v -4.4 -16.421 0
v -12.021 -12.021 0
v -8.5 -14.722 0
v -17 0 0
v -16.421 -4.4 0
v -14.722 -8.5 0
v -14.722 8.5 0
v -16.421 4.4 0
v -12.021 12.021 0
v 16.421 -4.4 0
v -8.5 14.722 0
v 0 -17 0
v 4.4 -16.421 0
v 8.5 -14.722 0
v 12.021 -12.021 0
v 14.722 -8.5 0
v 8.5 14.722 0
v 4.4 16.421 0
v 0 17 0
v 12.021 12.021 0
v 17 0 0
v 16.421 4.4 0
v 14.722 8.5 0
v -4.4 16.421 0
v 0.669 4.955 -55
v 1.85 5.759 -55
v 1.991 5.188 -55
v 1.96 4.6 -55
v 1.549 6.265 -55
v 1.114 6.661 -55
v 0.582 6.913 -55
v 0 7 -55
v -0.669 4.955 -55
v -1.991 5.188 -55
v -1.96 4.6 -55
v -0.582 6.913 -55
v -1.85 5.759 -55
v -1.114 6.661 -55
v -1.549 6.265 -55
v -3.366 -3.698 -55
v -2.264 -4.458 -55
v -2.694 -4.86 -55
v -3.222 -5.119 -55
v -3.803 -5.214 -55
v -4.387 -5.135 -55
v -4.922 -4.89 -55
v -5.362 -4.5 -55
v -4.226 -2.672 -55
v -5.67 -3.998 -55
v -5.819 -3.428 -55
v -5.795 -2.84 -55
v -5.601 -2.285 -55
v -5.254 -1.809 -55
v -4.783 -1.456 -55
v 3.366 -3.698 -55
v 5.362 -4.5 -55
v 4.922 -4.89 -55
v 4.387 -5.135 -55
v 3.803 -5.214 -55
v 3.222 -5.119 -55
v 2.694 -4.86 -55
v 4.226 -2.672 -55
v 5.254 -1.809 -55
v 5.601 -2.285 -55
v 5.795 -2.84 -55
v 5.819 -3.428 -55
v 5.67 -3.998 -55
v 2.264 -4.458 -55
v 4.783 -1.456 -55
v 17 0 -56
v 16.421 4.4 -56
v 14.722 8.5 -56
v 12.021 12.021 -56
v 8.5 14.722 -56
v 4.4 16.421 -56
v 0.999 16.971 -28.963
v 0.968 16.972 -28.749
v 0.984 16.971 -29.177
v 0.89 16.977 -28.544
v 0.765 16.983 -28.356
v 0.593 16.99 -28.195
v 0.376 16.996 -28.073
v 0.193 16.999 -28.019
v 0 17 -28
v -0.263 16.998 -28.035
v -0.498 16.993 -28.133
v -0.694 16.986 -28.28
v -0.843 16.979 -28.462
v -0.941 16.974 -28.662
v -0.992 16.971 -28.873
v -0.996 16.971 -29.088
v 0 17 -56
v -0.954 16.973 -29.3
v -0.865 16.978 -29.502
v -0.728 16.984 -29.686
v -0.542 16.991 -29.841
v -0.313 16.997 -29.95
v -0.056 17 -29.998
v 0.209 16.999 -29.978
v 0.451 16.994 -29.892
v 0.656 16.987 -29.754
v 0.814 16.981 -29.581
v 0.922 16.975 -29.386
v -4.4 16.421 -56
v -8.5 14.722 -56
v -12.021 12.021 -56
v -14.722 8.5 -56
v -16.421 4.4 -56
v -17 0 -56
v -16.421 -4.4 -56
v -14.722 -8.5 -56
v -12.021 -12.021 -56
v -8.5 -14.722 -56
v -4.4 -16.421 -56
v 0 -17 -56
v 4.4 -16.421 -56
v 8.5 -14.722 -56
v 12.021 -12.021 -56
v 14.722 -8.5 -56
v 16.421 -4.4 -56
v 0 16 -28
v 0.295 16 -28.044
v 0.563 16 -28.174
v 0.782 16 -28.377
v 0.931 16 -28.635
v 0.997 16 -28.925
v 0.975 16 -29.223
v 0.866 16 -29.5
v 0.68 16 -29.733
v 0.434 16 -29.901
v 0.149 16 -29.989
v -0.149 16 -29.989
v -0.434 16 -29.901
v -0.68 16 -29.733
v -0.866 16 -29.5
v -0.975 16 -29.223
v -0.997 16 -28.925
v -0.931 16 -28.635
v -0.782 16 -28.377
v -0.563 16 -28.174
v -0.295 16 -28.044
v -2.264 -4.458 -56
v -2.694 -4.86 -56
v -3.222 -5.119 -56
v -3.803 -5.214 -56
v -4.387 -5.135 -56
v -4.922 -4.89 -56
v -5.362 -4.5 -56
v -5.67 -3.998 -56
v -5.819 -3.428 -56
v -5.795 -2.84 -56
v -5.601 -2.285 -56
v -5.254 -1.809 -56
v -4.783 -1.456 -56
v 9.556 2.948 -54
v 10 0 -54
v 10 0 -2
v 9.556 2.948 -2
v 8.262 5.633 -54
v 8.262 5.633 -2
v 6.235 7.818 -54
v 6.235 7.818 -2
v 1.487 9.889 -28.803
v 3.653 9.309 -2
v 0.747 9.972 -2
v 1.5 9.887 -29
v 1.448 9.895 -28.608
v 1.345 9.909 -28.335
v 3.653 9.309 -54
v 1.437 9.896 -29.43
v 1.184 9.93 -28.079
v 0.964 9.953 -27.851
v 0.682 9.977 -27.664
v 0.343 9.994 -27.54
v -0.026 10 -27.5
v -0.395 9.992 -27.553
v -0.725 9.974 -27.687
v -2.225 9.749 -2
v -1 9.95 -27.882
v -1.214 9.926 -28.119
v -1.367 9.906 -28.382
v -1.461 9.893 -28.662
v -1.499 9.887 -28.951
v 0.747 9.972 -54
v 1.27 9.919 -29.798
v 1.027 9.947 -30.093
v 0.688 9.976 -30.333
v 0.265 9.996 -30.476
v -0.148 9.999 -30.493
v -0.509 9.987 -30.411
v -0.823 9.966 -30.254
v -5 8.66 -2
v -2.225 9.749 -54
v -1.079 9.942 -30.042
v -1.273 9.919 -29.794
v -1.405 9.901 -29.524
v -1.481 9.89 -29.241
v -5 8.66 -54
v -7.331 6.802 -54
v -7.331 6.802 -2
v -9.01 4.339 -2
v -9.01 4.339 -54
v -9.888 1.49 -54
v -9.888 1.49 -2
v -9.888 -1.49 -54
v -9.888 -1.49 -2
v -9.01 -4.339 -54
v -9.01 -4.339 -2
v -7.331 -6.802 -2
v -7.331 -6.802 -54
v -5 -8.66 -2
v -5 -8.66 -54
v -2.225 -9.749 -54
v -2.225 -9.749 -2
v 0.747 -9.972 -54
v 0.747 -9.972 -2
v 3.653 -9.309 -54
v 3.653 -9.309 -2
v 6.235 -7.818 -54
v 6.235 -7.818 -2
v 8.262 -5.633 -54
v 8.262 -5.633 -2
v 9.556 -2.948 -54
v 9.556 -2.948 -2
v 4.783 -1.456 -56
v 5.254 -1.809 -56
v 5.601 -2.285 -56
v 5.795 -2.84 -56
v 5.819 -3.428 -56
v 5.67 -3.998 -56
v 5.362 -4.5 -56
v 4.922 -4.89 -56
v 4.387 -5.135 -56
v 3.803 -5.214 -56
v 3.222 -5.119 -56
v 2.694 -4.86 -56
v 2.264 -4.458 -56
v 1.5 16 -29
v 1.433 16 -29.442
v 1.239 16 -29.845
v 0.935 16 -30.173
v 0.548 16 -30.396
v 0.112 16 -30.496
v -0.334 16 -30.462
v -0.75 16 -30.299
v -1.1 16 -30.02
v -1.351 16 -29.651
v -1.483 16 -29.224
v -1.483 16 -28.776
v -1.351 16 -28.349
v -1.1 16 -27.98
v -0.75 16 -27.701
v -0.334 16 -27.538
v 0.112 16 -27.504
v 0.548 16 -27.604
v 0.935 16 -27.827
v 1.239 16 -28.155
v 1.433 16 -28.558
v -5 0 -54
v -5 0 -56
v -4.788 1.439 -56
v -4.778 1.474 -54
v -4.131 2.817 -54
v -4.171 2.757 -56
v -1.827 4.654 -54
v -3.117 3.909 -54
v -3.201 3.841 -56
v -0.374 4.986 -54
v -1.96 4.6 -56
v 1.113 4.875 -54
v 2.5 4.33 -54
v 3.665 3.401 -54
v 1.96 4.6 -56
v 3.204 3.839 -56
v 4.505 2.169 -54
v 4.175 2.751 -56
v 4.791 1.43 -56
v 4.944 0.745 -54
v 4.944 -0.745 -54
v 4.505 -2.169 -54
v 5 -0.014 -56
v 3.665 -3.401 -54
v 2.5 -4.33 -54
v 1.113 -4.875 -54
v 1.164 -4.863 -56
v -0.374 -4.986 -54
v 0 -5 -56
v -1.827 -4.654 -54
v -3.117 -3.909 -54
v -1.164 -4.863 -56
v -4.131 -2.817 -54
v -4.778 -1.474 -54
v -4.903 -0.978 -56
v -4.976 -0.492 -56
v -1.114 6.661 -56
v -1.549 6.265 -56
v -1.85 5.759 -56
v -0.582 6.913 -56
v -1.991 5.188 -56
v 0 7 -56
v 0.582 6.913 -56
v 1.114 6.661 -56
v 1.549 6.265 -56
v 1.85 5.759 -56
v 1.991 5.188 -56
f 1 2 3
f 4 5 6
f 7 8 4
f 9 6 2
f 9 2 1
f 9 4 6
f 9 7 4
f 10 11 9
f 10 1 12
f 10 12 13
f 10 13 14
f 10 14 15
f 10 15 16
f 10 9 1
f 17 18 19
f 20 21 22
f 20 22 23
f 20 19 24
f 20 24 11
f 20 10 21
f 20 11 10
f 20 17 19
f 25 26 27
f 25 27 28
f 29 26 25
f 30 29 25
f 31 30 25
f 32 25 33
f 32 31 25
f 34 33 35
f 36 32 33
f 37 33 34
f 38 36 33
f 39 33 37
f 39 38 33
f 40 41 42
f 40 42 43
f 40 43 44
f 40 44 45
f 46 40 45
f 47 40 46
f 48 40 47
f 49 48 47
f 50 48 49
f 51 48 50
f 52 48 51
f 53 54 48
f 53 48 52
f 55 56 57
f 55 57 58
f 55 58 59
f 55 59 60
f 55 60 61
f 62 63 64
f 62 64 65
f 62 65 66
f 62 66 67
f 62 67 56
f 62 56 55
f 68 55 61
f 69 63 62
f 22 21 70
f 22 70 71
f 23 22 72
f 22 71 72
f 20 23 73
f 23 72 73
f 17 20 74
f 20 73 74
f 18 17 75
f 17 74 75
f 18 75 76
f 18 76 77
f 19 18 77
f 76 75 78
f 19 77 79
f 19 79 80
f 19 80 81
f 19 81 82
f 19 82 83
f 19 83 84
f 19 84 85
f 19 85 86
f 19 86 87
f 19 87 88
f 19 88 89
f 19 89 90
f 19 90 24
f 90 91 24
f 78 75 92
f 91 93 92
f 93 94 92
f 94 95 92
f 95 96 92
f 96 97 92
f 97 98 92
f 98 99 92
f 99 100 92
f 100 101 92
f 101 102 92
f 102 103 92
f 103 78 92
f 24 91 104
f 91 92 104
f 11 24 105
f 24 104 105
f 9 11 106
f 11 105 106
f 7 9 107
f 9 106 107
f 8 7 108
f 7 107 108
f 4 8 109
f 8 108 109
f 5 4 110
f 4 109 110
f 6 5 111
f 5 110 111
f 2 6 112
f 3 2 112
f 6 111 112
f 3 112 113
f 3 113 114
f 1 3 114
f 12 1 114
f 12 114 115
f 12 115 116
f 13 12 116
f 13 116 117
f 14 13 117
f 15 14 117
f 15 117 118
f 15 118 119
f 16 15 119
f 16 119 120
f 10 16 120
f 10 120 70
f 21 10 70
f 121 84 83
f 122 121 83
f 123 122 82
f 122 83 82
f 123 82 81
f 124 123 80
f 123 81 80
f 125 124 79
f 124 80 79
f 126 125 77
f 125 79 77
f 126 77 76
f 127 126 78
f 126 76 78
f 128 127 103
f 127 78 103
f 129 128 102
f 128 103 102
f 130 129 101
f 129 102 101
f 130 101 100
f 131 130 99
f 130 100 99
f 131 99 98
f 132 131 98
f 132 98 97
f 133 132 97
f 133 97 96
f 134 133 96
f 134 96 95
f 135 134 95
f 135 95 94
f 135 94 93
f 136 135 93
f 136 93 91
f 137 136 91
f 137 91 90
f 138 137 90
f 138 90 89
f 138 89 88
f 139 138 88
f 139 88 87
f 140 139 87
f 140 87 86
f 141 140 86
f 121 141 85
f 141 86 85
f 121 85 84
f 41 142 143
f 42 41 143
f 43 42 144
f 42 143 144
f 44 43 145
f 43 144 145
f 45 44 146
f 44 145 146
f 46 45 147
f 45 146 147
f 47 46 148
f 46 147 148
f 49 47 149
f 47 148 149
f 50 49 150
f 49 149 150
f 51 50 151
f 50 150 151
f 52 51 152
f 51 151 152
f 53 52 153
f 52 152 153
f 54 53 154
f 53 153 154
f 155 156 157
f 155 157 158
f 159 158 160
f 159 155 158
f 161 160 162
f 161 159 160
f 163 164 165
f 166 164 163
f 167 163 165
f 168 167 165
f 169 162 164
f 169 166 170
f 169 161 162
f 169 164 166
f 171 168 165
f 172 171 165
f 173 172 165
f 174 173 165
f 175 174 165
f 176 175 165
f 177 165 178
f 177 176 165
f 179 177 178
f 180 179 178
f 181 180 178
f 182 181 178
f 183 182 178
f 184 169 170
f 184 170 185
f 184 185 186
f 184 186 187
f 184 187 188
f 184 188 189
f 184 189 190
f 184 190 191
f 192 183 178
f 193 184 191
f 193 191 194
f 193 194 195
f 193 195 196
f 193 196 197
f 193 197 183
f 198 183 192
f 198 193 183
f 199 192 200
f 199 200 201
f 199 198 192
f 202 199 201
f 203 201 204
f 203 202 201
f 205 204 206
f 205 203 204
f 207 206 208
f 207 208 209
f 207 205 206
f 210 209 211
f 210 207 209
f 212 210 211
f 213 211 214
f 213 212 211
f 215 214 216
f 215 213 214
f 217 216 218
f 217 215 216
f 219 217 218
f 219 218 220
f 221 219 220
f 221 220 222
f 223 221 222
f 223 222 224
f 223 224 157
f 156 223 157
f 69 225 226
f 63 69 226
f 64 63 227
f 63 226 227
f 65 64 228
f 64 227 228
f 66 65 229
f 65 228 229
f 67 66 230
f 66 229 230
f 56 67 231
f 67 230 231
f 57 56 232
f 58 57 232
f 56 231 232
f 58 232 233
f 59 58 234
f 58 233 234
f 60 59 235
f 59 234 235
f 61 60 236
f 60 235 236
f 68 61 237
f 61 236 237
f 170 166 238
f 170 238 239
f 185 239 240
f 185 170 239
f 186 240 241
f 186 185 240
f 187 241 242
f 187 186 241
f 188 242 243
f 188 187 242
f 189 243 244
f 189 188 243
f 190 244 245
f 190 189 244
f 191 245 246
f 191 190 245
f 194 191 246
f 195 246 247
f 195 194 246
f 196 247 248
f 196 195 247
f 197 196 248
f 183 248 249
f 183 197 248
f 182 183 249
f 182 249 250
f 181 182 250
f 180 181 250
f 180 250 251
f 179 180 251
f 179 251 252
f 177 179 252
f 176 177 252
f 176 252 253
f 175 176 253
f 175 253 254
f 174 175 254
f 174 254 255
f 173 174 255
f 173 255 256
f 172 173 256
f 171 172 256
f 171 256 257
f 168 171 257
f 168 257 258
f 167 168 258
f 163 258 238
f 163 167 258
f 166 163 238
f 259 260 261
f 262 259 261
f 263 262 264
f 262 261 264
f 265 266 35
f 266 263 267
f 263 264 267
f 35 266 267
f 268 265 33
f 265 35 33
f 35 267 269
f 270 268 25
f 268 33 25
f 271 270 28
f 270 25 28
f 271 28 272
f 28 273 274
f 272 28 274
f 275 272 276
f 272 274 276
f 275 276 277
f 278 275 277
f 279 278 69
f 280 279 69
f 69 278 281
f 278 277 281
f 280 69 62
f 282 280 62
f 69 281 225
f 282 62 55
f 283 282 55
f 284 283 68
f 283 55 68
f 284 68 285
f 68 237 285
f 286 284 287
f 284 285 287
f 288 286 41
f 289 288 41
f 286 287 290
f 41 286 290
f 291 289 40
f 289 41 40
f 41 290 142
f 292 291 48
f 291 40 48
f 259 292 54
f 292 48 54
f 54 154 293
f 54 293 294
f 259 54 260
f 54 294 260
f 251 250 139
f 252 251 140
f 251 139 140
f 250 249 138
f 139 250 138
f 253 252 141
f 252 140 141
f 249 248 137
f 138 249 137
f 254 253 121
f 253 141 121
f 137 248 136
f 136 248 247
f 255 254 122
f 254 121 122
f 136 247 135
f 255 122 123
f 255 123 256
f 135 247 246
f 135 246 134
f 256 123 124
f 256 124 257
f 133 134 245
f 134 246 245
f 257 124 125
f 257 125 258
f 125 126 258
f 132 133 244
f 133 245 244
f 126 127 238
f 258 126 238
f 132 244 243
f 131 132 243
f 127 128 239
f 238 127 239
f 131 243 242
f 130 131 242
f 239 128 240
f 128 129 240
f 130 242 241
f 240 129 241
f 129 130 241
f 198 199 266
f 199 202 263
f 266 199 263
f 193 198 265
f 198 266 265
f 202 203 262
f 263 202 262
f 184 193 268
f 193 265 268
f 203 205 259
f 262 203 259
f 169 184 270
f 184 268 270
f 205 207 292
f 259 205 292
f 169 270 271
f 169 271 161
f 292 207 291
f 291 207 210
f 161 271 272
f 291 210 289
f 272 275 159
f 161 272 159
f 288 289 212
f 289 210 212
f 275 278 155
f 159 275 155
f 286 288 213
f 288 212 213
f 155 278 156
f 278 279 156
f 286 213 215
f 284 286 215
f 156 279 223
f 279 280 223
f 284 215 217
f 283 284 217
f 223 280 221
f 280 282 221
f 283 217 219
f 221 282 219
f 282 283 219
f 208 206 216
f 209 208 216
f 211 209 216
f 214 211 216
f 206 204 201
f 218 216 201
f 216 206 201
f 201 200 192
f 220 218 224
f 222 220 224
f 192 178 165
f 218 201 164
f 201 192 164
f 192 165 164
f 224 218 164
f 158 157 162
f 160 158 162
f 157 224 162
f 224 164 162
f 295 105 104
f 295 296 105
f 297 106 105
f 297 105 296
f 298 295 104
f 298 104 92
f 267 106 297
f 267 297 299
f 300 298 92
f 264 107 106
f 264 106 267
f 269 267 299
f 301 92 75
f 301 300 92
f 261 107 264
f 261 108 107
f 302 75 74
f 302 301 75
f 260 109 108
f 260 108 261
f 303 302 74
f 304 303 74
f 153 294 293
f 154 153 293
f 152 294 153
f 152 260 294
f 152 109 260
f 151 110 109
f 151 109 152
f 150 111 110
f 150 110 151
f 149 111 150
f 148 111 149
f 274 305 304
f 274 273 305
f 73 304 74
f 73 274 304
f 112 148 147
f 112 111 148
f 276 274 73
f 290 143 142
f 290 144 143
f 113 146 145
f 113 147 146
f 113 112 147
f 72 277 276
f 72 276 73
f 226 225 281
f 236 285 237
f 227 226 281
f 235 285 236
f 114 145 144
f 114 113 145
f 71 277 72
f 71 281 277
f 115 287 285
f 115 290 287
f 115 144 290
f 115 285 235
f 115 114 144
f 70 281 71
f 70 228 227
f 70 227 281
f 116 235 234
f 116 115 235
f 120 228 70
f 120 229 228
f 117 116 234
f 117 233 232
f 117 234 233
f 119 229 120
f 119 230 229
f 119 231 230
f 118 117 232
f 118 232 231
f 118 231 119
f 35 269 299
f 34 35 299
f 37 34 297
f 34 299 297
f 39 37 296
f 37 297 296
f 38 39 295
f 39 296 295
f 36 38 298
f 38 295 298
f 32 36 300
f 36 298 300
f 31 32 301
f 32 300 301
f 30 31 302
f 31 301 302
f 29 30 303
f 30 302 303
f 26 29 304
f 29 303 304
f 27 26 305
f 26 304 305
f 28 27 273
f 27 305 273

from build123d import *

# Parameters (mm, degrees)
FACE_2_R                      = 17
BOSS_EXTRUDE5_DEPTH           = 2
BOSS_EXTRUDE6_START           = -56
BOSS_EXTRUDE6_OUTLINE_R       = 17
BOSS_EXTRUDE6_OUTLINE_R_2     = 10
BOSS_EXTRUDE6_DEPTH           = 54
DRIVER_PIN_BODY_CUT_START     = 9.886859906
DRIVER_PIN_BODY_CUT_OUTLINE_R = 1.5
DRIVER_PIN_BODY_CUT_DEPTH     = 6.113140094
SKETCH5_R                     = 10
SKETCH5_R_2                   = 5
BOSS_EXTRUDE7_DEPTH           = 2
DRIVER_PIN_SKETCH_R           = 1
DRIVER_PIN_SKETCH_R_2         = 0.15
DRIVER_PIN_NECK_EXTRUDE_DEPTH = 1
SKETCH5_6_R                   = 5
SKETCH5_6_R_2                 = 2
CUT_EXTRUDE1_DEPTH            = 1


# Read off the part's stored shape, not the designer's step: Boss-Extrude6, driver_pin_body_cut
with BuildPart() as part:
    # face 2 → Boss-Extrude5 (new body)
    with BuildSketch(Plane.XY):
        Circle(FACE_2_R)
    extrude(amount=-BOSS_EXTRUDE5_DEPTH)

    # Boss-Extrude6 outline → Boss-Extrude6 (add)
    with BuildSketch(Plane.XY.offset(BOSS_EXTRUDE6_START)):
        Circle(BOSS_EXTRUDE6_OUTLINE_R)
        Circle(BOSS_EXTRUDE6_OUTLINE_R_2, mode=Mode.SUBTRACT)
    extrude(amount=BOSS_EXTRUDE6_DEPTH)

    # driver_pin_body_cut outline → driver_pin_body_cut (cut)
    with BuildSketch(Plane(origin=(0, 0, 0), x_dir=(1, 0, 0), z_dir=(0, 1, 0)).offset(DRIVER_PIN_BODY_CUT_START)):
        with Locations((0, 29)):
            Circle(DRIVER_PIN_BODY_CUT_OUTLINE_R)
    extrude(amount=DRIVER_PIN_BODY_CUT_DEPTH, mode=Mode.SUBTRACT)

    # Sketch5 → Boss-Extrude7 (add)
    with BuildSketch(Plane(origin=(0, 0, -56), x_dir=(-1, 0, 0), z_dir=(0, 0, -1))):
        with Locations(Location((0, 0, 0), (0, 0, 180))):
            Circle(SKETCH5_R)
        Circle(SKETCH5_R_2, mode=Mode.SUBTRACT)
    extrude(amount=-BOSS_EXTRUDE7_DEPTH)

    # driver_pin_sketch → driver_pin_neck_extrude (cut)
    # profile 1 of 2: a face of its own
    with BuildSketch(Plane(origin=(0, 17, 0), x_dir=(1, 0, 0), z_dir=(0, 1, 0))):
        with Locations(Location((0, 29, 0), (0, 0, 270))):
            Circle(DRIVER_PIN_SKETCH_R)
        with Locations((0, 29)):
            Circle(DRIVER_PIN_SKETCH_R_2, mode=Mode.SUBTRACT)
    # profile 2 of 2: a face of its own
    with BuildSketch(Plane(origin=(0, 17, 0), x_dir=(1, 0, 0), z_dir=(0, 1, 0))):
        with Locations((0, 29)):
            Circle(DRIVER_PIN_SKETCH_R_2)
    extrude(amount=-DRIVER_PIN_NECK_EXTRUDE_DEPTH, mode=Mode.SUBTRACT)

    # Sketch5<6> → Cut-Extrude1 (cut)
    with BuildSketch(Plane(origin=(0, 0, -56), x_dir=(-1, 0, 0), z_dir=(0, 0, -1))):
        Circle(SKETCH5_6_R)
        with Locations((3.830222216, -3.213938048)):
            Circle(SKETCH5_6_R_2)
        with Locations((-3.830222216, -3.213938048)):
            Circle(SKETCH5_6_R_2)
        with Locations((0, 5)):
            Circle(SKETCH5_6_R_2)
    extrude(amount=-CUT_EXTRUDE1_DEPTH, mode=Mode.SUBTRACT)


solid = part.part
